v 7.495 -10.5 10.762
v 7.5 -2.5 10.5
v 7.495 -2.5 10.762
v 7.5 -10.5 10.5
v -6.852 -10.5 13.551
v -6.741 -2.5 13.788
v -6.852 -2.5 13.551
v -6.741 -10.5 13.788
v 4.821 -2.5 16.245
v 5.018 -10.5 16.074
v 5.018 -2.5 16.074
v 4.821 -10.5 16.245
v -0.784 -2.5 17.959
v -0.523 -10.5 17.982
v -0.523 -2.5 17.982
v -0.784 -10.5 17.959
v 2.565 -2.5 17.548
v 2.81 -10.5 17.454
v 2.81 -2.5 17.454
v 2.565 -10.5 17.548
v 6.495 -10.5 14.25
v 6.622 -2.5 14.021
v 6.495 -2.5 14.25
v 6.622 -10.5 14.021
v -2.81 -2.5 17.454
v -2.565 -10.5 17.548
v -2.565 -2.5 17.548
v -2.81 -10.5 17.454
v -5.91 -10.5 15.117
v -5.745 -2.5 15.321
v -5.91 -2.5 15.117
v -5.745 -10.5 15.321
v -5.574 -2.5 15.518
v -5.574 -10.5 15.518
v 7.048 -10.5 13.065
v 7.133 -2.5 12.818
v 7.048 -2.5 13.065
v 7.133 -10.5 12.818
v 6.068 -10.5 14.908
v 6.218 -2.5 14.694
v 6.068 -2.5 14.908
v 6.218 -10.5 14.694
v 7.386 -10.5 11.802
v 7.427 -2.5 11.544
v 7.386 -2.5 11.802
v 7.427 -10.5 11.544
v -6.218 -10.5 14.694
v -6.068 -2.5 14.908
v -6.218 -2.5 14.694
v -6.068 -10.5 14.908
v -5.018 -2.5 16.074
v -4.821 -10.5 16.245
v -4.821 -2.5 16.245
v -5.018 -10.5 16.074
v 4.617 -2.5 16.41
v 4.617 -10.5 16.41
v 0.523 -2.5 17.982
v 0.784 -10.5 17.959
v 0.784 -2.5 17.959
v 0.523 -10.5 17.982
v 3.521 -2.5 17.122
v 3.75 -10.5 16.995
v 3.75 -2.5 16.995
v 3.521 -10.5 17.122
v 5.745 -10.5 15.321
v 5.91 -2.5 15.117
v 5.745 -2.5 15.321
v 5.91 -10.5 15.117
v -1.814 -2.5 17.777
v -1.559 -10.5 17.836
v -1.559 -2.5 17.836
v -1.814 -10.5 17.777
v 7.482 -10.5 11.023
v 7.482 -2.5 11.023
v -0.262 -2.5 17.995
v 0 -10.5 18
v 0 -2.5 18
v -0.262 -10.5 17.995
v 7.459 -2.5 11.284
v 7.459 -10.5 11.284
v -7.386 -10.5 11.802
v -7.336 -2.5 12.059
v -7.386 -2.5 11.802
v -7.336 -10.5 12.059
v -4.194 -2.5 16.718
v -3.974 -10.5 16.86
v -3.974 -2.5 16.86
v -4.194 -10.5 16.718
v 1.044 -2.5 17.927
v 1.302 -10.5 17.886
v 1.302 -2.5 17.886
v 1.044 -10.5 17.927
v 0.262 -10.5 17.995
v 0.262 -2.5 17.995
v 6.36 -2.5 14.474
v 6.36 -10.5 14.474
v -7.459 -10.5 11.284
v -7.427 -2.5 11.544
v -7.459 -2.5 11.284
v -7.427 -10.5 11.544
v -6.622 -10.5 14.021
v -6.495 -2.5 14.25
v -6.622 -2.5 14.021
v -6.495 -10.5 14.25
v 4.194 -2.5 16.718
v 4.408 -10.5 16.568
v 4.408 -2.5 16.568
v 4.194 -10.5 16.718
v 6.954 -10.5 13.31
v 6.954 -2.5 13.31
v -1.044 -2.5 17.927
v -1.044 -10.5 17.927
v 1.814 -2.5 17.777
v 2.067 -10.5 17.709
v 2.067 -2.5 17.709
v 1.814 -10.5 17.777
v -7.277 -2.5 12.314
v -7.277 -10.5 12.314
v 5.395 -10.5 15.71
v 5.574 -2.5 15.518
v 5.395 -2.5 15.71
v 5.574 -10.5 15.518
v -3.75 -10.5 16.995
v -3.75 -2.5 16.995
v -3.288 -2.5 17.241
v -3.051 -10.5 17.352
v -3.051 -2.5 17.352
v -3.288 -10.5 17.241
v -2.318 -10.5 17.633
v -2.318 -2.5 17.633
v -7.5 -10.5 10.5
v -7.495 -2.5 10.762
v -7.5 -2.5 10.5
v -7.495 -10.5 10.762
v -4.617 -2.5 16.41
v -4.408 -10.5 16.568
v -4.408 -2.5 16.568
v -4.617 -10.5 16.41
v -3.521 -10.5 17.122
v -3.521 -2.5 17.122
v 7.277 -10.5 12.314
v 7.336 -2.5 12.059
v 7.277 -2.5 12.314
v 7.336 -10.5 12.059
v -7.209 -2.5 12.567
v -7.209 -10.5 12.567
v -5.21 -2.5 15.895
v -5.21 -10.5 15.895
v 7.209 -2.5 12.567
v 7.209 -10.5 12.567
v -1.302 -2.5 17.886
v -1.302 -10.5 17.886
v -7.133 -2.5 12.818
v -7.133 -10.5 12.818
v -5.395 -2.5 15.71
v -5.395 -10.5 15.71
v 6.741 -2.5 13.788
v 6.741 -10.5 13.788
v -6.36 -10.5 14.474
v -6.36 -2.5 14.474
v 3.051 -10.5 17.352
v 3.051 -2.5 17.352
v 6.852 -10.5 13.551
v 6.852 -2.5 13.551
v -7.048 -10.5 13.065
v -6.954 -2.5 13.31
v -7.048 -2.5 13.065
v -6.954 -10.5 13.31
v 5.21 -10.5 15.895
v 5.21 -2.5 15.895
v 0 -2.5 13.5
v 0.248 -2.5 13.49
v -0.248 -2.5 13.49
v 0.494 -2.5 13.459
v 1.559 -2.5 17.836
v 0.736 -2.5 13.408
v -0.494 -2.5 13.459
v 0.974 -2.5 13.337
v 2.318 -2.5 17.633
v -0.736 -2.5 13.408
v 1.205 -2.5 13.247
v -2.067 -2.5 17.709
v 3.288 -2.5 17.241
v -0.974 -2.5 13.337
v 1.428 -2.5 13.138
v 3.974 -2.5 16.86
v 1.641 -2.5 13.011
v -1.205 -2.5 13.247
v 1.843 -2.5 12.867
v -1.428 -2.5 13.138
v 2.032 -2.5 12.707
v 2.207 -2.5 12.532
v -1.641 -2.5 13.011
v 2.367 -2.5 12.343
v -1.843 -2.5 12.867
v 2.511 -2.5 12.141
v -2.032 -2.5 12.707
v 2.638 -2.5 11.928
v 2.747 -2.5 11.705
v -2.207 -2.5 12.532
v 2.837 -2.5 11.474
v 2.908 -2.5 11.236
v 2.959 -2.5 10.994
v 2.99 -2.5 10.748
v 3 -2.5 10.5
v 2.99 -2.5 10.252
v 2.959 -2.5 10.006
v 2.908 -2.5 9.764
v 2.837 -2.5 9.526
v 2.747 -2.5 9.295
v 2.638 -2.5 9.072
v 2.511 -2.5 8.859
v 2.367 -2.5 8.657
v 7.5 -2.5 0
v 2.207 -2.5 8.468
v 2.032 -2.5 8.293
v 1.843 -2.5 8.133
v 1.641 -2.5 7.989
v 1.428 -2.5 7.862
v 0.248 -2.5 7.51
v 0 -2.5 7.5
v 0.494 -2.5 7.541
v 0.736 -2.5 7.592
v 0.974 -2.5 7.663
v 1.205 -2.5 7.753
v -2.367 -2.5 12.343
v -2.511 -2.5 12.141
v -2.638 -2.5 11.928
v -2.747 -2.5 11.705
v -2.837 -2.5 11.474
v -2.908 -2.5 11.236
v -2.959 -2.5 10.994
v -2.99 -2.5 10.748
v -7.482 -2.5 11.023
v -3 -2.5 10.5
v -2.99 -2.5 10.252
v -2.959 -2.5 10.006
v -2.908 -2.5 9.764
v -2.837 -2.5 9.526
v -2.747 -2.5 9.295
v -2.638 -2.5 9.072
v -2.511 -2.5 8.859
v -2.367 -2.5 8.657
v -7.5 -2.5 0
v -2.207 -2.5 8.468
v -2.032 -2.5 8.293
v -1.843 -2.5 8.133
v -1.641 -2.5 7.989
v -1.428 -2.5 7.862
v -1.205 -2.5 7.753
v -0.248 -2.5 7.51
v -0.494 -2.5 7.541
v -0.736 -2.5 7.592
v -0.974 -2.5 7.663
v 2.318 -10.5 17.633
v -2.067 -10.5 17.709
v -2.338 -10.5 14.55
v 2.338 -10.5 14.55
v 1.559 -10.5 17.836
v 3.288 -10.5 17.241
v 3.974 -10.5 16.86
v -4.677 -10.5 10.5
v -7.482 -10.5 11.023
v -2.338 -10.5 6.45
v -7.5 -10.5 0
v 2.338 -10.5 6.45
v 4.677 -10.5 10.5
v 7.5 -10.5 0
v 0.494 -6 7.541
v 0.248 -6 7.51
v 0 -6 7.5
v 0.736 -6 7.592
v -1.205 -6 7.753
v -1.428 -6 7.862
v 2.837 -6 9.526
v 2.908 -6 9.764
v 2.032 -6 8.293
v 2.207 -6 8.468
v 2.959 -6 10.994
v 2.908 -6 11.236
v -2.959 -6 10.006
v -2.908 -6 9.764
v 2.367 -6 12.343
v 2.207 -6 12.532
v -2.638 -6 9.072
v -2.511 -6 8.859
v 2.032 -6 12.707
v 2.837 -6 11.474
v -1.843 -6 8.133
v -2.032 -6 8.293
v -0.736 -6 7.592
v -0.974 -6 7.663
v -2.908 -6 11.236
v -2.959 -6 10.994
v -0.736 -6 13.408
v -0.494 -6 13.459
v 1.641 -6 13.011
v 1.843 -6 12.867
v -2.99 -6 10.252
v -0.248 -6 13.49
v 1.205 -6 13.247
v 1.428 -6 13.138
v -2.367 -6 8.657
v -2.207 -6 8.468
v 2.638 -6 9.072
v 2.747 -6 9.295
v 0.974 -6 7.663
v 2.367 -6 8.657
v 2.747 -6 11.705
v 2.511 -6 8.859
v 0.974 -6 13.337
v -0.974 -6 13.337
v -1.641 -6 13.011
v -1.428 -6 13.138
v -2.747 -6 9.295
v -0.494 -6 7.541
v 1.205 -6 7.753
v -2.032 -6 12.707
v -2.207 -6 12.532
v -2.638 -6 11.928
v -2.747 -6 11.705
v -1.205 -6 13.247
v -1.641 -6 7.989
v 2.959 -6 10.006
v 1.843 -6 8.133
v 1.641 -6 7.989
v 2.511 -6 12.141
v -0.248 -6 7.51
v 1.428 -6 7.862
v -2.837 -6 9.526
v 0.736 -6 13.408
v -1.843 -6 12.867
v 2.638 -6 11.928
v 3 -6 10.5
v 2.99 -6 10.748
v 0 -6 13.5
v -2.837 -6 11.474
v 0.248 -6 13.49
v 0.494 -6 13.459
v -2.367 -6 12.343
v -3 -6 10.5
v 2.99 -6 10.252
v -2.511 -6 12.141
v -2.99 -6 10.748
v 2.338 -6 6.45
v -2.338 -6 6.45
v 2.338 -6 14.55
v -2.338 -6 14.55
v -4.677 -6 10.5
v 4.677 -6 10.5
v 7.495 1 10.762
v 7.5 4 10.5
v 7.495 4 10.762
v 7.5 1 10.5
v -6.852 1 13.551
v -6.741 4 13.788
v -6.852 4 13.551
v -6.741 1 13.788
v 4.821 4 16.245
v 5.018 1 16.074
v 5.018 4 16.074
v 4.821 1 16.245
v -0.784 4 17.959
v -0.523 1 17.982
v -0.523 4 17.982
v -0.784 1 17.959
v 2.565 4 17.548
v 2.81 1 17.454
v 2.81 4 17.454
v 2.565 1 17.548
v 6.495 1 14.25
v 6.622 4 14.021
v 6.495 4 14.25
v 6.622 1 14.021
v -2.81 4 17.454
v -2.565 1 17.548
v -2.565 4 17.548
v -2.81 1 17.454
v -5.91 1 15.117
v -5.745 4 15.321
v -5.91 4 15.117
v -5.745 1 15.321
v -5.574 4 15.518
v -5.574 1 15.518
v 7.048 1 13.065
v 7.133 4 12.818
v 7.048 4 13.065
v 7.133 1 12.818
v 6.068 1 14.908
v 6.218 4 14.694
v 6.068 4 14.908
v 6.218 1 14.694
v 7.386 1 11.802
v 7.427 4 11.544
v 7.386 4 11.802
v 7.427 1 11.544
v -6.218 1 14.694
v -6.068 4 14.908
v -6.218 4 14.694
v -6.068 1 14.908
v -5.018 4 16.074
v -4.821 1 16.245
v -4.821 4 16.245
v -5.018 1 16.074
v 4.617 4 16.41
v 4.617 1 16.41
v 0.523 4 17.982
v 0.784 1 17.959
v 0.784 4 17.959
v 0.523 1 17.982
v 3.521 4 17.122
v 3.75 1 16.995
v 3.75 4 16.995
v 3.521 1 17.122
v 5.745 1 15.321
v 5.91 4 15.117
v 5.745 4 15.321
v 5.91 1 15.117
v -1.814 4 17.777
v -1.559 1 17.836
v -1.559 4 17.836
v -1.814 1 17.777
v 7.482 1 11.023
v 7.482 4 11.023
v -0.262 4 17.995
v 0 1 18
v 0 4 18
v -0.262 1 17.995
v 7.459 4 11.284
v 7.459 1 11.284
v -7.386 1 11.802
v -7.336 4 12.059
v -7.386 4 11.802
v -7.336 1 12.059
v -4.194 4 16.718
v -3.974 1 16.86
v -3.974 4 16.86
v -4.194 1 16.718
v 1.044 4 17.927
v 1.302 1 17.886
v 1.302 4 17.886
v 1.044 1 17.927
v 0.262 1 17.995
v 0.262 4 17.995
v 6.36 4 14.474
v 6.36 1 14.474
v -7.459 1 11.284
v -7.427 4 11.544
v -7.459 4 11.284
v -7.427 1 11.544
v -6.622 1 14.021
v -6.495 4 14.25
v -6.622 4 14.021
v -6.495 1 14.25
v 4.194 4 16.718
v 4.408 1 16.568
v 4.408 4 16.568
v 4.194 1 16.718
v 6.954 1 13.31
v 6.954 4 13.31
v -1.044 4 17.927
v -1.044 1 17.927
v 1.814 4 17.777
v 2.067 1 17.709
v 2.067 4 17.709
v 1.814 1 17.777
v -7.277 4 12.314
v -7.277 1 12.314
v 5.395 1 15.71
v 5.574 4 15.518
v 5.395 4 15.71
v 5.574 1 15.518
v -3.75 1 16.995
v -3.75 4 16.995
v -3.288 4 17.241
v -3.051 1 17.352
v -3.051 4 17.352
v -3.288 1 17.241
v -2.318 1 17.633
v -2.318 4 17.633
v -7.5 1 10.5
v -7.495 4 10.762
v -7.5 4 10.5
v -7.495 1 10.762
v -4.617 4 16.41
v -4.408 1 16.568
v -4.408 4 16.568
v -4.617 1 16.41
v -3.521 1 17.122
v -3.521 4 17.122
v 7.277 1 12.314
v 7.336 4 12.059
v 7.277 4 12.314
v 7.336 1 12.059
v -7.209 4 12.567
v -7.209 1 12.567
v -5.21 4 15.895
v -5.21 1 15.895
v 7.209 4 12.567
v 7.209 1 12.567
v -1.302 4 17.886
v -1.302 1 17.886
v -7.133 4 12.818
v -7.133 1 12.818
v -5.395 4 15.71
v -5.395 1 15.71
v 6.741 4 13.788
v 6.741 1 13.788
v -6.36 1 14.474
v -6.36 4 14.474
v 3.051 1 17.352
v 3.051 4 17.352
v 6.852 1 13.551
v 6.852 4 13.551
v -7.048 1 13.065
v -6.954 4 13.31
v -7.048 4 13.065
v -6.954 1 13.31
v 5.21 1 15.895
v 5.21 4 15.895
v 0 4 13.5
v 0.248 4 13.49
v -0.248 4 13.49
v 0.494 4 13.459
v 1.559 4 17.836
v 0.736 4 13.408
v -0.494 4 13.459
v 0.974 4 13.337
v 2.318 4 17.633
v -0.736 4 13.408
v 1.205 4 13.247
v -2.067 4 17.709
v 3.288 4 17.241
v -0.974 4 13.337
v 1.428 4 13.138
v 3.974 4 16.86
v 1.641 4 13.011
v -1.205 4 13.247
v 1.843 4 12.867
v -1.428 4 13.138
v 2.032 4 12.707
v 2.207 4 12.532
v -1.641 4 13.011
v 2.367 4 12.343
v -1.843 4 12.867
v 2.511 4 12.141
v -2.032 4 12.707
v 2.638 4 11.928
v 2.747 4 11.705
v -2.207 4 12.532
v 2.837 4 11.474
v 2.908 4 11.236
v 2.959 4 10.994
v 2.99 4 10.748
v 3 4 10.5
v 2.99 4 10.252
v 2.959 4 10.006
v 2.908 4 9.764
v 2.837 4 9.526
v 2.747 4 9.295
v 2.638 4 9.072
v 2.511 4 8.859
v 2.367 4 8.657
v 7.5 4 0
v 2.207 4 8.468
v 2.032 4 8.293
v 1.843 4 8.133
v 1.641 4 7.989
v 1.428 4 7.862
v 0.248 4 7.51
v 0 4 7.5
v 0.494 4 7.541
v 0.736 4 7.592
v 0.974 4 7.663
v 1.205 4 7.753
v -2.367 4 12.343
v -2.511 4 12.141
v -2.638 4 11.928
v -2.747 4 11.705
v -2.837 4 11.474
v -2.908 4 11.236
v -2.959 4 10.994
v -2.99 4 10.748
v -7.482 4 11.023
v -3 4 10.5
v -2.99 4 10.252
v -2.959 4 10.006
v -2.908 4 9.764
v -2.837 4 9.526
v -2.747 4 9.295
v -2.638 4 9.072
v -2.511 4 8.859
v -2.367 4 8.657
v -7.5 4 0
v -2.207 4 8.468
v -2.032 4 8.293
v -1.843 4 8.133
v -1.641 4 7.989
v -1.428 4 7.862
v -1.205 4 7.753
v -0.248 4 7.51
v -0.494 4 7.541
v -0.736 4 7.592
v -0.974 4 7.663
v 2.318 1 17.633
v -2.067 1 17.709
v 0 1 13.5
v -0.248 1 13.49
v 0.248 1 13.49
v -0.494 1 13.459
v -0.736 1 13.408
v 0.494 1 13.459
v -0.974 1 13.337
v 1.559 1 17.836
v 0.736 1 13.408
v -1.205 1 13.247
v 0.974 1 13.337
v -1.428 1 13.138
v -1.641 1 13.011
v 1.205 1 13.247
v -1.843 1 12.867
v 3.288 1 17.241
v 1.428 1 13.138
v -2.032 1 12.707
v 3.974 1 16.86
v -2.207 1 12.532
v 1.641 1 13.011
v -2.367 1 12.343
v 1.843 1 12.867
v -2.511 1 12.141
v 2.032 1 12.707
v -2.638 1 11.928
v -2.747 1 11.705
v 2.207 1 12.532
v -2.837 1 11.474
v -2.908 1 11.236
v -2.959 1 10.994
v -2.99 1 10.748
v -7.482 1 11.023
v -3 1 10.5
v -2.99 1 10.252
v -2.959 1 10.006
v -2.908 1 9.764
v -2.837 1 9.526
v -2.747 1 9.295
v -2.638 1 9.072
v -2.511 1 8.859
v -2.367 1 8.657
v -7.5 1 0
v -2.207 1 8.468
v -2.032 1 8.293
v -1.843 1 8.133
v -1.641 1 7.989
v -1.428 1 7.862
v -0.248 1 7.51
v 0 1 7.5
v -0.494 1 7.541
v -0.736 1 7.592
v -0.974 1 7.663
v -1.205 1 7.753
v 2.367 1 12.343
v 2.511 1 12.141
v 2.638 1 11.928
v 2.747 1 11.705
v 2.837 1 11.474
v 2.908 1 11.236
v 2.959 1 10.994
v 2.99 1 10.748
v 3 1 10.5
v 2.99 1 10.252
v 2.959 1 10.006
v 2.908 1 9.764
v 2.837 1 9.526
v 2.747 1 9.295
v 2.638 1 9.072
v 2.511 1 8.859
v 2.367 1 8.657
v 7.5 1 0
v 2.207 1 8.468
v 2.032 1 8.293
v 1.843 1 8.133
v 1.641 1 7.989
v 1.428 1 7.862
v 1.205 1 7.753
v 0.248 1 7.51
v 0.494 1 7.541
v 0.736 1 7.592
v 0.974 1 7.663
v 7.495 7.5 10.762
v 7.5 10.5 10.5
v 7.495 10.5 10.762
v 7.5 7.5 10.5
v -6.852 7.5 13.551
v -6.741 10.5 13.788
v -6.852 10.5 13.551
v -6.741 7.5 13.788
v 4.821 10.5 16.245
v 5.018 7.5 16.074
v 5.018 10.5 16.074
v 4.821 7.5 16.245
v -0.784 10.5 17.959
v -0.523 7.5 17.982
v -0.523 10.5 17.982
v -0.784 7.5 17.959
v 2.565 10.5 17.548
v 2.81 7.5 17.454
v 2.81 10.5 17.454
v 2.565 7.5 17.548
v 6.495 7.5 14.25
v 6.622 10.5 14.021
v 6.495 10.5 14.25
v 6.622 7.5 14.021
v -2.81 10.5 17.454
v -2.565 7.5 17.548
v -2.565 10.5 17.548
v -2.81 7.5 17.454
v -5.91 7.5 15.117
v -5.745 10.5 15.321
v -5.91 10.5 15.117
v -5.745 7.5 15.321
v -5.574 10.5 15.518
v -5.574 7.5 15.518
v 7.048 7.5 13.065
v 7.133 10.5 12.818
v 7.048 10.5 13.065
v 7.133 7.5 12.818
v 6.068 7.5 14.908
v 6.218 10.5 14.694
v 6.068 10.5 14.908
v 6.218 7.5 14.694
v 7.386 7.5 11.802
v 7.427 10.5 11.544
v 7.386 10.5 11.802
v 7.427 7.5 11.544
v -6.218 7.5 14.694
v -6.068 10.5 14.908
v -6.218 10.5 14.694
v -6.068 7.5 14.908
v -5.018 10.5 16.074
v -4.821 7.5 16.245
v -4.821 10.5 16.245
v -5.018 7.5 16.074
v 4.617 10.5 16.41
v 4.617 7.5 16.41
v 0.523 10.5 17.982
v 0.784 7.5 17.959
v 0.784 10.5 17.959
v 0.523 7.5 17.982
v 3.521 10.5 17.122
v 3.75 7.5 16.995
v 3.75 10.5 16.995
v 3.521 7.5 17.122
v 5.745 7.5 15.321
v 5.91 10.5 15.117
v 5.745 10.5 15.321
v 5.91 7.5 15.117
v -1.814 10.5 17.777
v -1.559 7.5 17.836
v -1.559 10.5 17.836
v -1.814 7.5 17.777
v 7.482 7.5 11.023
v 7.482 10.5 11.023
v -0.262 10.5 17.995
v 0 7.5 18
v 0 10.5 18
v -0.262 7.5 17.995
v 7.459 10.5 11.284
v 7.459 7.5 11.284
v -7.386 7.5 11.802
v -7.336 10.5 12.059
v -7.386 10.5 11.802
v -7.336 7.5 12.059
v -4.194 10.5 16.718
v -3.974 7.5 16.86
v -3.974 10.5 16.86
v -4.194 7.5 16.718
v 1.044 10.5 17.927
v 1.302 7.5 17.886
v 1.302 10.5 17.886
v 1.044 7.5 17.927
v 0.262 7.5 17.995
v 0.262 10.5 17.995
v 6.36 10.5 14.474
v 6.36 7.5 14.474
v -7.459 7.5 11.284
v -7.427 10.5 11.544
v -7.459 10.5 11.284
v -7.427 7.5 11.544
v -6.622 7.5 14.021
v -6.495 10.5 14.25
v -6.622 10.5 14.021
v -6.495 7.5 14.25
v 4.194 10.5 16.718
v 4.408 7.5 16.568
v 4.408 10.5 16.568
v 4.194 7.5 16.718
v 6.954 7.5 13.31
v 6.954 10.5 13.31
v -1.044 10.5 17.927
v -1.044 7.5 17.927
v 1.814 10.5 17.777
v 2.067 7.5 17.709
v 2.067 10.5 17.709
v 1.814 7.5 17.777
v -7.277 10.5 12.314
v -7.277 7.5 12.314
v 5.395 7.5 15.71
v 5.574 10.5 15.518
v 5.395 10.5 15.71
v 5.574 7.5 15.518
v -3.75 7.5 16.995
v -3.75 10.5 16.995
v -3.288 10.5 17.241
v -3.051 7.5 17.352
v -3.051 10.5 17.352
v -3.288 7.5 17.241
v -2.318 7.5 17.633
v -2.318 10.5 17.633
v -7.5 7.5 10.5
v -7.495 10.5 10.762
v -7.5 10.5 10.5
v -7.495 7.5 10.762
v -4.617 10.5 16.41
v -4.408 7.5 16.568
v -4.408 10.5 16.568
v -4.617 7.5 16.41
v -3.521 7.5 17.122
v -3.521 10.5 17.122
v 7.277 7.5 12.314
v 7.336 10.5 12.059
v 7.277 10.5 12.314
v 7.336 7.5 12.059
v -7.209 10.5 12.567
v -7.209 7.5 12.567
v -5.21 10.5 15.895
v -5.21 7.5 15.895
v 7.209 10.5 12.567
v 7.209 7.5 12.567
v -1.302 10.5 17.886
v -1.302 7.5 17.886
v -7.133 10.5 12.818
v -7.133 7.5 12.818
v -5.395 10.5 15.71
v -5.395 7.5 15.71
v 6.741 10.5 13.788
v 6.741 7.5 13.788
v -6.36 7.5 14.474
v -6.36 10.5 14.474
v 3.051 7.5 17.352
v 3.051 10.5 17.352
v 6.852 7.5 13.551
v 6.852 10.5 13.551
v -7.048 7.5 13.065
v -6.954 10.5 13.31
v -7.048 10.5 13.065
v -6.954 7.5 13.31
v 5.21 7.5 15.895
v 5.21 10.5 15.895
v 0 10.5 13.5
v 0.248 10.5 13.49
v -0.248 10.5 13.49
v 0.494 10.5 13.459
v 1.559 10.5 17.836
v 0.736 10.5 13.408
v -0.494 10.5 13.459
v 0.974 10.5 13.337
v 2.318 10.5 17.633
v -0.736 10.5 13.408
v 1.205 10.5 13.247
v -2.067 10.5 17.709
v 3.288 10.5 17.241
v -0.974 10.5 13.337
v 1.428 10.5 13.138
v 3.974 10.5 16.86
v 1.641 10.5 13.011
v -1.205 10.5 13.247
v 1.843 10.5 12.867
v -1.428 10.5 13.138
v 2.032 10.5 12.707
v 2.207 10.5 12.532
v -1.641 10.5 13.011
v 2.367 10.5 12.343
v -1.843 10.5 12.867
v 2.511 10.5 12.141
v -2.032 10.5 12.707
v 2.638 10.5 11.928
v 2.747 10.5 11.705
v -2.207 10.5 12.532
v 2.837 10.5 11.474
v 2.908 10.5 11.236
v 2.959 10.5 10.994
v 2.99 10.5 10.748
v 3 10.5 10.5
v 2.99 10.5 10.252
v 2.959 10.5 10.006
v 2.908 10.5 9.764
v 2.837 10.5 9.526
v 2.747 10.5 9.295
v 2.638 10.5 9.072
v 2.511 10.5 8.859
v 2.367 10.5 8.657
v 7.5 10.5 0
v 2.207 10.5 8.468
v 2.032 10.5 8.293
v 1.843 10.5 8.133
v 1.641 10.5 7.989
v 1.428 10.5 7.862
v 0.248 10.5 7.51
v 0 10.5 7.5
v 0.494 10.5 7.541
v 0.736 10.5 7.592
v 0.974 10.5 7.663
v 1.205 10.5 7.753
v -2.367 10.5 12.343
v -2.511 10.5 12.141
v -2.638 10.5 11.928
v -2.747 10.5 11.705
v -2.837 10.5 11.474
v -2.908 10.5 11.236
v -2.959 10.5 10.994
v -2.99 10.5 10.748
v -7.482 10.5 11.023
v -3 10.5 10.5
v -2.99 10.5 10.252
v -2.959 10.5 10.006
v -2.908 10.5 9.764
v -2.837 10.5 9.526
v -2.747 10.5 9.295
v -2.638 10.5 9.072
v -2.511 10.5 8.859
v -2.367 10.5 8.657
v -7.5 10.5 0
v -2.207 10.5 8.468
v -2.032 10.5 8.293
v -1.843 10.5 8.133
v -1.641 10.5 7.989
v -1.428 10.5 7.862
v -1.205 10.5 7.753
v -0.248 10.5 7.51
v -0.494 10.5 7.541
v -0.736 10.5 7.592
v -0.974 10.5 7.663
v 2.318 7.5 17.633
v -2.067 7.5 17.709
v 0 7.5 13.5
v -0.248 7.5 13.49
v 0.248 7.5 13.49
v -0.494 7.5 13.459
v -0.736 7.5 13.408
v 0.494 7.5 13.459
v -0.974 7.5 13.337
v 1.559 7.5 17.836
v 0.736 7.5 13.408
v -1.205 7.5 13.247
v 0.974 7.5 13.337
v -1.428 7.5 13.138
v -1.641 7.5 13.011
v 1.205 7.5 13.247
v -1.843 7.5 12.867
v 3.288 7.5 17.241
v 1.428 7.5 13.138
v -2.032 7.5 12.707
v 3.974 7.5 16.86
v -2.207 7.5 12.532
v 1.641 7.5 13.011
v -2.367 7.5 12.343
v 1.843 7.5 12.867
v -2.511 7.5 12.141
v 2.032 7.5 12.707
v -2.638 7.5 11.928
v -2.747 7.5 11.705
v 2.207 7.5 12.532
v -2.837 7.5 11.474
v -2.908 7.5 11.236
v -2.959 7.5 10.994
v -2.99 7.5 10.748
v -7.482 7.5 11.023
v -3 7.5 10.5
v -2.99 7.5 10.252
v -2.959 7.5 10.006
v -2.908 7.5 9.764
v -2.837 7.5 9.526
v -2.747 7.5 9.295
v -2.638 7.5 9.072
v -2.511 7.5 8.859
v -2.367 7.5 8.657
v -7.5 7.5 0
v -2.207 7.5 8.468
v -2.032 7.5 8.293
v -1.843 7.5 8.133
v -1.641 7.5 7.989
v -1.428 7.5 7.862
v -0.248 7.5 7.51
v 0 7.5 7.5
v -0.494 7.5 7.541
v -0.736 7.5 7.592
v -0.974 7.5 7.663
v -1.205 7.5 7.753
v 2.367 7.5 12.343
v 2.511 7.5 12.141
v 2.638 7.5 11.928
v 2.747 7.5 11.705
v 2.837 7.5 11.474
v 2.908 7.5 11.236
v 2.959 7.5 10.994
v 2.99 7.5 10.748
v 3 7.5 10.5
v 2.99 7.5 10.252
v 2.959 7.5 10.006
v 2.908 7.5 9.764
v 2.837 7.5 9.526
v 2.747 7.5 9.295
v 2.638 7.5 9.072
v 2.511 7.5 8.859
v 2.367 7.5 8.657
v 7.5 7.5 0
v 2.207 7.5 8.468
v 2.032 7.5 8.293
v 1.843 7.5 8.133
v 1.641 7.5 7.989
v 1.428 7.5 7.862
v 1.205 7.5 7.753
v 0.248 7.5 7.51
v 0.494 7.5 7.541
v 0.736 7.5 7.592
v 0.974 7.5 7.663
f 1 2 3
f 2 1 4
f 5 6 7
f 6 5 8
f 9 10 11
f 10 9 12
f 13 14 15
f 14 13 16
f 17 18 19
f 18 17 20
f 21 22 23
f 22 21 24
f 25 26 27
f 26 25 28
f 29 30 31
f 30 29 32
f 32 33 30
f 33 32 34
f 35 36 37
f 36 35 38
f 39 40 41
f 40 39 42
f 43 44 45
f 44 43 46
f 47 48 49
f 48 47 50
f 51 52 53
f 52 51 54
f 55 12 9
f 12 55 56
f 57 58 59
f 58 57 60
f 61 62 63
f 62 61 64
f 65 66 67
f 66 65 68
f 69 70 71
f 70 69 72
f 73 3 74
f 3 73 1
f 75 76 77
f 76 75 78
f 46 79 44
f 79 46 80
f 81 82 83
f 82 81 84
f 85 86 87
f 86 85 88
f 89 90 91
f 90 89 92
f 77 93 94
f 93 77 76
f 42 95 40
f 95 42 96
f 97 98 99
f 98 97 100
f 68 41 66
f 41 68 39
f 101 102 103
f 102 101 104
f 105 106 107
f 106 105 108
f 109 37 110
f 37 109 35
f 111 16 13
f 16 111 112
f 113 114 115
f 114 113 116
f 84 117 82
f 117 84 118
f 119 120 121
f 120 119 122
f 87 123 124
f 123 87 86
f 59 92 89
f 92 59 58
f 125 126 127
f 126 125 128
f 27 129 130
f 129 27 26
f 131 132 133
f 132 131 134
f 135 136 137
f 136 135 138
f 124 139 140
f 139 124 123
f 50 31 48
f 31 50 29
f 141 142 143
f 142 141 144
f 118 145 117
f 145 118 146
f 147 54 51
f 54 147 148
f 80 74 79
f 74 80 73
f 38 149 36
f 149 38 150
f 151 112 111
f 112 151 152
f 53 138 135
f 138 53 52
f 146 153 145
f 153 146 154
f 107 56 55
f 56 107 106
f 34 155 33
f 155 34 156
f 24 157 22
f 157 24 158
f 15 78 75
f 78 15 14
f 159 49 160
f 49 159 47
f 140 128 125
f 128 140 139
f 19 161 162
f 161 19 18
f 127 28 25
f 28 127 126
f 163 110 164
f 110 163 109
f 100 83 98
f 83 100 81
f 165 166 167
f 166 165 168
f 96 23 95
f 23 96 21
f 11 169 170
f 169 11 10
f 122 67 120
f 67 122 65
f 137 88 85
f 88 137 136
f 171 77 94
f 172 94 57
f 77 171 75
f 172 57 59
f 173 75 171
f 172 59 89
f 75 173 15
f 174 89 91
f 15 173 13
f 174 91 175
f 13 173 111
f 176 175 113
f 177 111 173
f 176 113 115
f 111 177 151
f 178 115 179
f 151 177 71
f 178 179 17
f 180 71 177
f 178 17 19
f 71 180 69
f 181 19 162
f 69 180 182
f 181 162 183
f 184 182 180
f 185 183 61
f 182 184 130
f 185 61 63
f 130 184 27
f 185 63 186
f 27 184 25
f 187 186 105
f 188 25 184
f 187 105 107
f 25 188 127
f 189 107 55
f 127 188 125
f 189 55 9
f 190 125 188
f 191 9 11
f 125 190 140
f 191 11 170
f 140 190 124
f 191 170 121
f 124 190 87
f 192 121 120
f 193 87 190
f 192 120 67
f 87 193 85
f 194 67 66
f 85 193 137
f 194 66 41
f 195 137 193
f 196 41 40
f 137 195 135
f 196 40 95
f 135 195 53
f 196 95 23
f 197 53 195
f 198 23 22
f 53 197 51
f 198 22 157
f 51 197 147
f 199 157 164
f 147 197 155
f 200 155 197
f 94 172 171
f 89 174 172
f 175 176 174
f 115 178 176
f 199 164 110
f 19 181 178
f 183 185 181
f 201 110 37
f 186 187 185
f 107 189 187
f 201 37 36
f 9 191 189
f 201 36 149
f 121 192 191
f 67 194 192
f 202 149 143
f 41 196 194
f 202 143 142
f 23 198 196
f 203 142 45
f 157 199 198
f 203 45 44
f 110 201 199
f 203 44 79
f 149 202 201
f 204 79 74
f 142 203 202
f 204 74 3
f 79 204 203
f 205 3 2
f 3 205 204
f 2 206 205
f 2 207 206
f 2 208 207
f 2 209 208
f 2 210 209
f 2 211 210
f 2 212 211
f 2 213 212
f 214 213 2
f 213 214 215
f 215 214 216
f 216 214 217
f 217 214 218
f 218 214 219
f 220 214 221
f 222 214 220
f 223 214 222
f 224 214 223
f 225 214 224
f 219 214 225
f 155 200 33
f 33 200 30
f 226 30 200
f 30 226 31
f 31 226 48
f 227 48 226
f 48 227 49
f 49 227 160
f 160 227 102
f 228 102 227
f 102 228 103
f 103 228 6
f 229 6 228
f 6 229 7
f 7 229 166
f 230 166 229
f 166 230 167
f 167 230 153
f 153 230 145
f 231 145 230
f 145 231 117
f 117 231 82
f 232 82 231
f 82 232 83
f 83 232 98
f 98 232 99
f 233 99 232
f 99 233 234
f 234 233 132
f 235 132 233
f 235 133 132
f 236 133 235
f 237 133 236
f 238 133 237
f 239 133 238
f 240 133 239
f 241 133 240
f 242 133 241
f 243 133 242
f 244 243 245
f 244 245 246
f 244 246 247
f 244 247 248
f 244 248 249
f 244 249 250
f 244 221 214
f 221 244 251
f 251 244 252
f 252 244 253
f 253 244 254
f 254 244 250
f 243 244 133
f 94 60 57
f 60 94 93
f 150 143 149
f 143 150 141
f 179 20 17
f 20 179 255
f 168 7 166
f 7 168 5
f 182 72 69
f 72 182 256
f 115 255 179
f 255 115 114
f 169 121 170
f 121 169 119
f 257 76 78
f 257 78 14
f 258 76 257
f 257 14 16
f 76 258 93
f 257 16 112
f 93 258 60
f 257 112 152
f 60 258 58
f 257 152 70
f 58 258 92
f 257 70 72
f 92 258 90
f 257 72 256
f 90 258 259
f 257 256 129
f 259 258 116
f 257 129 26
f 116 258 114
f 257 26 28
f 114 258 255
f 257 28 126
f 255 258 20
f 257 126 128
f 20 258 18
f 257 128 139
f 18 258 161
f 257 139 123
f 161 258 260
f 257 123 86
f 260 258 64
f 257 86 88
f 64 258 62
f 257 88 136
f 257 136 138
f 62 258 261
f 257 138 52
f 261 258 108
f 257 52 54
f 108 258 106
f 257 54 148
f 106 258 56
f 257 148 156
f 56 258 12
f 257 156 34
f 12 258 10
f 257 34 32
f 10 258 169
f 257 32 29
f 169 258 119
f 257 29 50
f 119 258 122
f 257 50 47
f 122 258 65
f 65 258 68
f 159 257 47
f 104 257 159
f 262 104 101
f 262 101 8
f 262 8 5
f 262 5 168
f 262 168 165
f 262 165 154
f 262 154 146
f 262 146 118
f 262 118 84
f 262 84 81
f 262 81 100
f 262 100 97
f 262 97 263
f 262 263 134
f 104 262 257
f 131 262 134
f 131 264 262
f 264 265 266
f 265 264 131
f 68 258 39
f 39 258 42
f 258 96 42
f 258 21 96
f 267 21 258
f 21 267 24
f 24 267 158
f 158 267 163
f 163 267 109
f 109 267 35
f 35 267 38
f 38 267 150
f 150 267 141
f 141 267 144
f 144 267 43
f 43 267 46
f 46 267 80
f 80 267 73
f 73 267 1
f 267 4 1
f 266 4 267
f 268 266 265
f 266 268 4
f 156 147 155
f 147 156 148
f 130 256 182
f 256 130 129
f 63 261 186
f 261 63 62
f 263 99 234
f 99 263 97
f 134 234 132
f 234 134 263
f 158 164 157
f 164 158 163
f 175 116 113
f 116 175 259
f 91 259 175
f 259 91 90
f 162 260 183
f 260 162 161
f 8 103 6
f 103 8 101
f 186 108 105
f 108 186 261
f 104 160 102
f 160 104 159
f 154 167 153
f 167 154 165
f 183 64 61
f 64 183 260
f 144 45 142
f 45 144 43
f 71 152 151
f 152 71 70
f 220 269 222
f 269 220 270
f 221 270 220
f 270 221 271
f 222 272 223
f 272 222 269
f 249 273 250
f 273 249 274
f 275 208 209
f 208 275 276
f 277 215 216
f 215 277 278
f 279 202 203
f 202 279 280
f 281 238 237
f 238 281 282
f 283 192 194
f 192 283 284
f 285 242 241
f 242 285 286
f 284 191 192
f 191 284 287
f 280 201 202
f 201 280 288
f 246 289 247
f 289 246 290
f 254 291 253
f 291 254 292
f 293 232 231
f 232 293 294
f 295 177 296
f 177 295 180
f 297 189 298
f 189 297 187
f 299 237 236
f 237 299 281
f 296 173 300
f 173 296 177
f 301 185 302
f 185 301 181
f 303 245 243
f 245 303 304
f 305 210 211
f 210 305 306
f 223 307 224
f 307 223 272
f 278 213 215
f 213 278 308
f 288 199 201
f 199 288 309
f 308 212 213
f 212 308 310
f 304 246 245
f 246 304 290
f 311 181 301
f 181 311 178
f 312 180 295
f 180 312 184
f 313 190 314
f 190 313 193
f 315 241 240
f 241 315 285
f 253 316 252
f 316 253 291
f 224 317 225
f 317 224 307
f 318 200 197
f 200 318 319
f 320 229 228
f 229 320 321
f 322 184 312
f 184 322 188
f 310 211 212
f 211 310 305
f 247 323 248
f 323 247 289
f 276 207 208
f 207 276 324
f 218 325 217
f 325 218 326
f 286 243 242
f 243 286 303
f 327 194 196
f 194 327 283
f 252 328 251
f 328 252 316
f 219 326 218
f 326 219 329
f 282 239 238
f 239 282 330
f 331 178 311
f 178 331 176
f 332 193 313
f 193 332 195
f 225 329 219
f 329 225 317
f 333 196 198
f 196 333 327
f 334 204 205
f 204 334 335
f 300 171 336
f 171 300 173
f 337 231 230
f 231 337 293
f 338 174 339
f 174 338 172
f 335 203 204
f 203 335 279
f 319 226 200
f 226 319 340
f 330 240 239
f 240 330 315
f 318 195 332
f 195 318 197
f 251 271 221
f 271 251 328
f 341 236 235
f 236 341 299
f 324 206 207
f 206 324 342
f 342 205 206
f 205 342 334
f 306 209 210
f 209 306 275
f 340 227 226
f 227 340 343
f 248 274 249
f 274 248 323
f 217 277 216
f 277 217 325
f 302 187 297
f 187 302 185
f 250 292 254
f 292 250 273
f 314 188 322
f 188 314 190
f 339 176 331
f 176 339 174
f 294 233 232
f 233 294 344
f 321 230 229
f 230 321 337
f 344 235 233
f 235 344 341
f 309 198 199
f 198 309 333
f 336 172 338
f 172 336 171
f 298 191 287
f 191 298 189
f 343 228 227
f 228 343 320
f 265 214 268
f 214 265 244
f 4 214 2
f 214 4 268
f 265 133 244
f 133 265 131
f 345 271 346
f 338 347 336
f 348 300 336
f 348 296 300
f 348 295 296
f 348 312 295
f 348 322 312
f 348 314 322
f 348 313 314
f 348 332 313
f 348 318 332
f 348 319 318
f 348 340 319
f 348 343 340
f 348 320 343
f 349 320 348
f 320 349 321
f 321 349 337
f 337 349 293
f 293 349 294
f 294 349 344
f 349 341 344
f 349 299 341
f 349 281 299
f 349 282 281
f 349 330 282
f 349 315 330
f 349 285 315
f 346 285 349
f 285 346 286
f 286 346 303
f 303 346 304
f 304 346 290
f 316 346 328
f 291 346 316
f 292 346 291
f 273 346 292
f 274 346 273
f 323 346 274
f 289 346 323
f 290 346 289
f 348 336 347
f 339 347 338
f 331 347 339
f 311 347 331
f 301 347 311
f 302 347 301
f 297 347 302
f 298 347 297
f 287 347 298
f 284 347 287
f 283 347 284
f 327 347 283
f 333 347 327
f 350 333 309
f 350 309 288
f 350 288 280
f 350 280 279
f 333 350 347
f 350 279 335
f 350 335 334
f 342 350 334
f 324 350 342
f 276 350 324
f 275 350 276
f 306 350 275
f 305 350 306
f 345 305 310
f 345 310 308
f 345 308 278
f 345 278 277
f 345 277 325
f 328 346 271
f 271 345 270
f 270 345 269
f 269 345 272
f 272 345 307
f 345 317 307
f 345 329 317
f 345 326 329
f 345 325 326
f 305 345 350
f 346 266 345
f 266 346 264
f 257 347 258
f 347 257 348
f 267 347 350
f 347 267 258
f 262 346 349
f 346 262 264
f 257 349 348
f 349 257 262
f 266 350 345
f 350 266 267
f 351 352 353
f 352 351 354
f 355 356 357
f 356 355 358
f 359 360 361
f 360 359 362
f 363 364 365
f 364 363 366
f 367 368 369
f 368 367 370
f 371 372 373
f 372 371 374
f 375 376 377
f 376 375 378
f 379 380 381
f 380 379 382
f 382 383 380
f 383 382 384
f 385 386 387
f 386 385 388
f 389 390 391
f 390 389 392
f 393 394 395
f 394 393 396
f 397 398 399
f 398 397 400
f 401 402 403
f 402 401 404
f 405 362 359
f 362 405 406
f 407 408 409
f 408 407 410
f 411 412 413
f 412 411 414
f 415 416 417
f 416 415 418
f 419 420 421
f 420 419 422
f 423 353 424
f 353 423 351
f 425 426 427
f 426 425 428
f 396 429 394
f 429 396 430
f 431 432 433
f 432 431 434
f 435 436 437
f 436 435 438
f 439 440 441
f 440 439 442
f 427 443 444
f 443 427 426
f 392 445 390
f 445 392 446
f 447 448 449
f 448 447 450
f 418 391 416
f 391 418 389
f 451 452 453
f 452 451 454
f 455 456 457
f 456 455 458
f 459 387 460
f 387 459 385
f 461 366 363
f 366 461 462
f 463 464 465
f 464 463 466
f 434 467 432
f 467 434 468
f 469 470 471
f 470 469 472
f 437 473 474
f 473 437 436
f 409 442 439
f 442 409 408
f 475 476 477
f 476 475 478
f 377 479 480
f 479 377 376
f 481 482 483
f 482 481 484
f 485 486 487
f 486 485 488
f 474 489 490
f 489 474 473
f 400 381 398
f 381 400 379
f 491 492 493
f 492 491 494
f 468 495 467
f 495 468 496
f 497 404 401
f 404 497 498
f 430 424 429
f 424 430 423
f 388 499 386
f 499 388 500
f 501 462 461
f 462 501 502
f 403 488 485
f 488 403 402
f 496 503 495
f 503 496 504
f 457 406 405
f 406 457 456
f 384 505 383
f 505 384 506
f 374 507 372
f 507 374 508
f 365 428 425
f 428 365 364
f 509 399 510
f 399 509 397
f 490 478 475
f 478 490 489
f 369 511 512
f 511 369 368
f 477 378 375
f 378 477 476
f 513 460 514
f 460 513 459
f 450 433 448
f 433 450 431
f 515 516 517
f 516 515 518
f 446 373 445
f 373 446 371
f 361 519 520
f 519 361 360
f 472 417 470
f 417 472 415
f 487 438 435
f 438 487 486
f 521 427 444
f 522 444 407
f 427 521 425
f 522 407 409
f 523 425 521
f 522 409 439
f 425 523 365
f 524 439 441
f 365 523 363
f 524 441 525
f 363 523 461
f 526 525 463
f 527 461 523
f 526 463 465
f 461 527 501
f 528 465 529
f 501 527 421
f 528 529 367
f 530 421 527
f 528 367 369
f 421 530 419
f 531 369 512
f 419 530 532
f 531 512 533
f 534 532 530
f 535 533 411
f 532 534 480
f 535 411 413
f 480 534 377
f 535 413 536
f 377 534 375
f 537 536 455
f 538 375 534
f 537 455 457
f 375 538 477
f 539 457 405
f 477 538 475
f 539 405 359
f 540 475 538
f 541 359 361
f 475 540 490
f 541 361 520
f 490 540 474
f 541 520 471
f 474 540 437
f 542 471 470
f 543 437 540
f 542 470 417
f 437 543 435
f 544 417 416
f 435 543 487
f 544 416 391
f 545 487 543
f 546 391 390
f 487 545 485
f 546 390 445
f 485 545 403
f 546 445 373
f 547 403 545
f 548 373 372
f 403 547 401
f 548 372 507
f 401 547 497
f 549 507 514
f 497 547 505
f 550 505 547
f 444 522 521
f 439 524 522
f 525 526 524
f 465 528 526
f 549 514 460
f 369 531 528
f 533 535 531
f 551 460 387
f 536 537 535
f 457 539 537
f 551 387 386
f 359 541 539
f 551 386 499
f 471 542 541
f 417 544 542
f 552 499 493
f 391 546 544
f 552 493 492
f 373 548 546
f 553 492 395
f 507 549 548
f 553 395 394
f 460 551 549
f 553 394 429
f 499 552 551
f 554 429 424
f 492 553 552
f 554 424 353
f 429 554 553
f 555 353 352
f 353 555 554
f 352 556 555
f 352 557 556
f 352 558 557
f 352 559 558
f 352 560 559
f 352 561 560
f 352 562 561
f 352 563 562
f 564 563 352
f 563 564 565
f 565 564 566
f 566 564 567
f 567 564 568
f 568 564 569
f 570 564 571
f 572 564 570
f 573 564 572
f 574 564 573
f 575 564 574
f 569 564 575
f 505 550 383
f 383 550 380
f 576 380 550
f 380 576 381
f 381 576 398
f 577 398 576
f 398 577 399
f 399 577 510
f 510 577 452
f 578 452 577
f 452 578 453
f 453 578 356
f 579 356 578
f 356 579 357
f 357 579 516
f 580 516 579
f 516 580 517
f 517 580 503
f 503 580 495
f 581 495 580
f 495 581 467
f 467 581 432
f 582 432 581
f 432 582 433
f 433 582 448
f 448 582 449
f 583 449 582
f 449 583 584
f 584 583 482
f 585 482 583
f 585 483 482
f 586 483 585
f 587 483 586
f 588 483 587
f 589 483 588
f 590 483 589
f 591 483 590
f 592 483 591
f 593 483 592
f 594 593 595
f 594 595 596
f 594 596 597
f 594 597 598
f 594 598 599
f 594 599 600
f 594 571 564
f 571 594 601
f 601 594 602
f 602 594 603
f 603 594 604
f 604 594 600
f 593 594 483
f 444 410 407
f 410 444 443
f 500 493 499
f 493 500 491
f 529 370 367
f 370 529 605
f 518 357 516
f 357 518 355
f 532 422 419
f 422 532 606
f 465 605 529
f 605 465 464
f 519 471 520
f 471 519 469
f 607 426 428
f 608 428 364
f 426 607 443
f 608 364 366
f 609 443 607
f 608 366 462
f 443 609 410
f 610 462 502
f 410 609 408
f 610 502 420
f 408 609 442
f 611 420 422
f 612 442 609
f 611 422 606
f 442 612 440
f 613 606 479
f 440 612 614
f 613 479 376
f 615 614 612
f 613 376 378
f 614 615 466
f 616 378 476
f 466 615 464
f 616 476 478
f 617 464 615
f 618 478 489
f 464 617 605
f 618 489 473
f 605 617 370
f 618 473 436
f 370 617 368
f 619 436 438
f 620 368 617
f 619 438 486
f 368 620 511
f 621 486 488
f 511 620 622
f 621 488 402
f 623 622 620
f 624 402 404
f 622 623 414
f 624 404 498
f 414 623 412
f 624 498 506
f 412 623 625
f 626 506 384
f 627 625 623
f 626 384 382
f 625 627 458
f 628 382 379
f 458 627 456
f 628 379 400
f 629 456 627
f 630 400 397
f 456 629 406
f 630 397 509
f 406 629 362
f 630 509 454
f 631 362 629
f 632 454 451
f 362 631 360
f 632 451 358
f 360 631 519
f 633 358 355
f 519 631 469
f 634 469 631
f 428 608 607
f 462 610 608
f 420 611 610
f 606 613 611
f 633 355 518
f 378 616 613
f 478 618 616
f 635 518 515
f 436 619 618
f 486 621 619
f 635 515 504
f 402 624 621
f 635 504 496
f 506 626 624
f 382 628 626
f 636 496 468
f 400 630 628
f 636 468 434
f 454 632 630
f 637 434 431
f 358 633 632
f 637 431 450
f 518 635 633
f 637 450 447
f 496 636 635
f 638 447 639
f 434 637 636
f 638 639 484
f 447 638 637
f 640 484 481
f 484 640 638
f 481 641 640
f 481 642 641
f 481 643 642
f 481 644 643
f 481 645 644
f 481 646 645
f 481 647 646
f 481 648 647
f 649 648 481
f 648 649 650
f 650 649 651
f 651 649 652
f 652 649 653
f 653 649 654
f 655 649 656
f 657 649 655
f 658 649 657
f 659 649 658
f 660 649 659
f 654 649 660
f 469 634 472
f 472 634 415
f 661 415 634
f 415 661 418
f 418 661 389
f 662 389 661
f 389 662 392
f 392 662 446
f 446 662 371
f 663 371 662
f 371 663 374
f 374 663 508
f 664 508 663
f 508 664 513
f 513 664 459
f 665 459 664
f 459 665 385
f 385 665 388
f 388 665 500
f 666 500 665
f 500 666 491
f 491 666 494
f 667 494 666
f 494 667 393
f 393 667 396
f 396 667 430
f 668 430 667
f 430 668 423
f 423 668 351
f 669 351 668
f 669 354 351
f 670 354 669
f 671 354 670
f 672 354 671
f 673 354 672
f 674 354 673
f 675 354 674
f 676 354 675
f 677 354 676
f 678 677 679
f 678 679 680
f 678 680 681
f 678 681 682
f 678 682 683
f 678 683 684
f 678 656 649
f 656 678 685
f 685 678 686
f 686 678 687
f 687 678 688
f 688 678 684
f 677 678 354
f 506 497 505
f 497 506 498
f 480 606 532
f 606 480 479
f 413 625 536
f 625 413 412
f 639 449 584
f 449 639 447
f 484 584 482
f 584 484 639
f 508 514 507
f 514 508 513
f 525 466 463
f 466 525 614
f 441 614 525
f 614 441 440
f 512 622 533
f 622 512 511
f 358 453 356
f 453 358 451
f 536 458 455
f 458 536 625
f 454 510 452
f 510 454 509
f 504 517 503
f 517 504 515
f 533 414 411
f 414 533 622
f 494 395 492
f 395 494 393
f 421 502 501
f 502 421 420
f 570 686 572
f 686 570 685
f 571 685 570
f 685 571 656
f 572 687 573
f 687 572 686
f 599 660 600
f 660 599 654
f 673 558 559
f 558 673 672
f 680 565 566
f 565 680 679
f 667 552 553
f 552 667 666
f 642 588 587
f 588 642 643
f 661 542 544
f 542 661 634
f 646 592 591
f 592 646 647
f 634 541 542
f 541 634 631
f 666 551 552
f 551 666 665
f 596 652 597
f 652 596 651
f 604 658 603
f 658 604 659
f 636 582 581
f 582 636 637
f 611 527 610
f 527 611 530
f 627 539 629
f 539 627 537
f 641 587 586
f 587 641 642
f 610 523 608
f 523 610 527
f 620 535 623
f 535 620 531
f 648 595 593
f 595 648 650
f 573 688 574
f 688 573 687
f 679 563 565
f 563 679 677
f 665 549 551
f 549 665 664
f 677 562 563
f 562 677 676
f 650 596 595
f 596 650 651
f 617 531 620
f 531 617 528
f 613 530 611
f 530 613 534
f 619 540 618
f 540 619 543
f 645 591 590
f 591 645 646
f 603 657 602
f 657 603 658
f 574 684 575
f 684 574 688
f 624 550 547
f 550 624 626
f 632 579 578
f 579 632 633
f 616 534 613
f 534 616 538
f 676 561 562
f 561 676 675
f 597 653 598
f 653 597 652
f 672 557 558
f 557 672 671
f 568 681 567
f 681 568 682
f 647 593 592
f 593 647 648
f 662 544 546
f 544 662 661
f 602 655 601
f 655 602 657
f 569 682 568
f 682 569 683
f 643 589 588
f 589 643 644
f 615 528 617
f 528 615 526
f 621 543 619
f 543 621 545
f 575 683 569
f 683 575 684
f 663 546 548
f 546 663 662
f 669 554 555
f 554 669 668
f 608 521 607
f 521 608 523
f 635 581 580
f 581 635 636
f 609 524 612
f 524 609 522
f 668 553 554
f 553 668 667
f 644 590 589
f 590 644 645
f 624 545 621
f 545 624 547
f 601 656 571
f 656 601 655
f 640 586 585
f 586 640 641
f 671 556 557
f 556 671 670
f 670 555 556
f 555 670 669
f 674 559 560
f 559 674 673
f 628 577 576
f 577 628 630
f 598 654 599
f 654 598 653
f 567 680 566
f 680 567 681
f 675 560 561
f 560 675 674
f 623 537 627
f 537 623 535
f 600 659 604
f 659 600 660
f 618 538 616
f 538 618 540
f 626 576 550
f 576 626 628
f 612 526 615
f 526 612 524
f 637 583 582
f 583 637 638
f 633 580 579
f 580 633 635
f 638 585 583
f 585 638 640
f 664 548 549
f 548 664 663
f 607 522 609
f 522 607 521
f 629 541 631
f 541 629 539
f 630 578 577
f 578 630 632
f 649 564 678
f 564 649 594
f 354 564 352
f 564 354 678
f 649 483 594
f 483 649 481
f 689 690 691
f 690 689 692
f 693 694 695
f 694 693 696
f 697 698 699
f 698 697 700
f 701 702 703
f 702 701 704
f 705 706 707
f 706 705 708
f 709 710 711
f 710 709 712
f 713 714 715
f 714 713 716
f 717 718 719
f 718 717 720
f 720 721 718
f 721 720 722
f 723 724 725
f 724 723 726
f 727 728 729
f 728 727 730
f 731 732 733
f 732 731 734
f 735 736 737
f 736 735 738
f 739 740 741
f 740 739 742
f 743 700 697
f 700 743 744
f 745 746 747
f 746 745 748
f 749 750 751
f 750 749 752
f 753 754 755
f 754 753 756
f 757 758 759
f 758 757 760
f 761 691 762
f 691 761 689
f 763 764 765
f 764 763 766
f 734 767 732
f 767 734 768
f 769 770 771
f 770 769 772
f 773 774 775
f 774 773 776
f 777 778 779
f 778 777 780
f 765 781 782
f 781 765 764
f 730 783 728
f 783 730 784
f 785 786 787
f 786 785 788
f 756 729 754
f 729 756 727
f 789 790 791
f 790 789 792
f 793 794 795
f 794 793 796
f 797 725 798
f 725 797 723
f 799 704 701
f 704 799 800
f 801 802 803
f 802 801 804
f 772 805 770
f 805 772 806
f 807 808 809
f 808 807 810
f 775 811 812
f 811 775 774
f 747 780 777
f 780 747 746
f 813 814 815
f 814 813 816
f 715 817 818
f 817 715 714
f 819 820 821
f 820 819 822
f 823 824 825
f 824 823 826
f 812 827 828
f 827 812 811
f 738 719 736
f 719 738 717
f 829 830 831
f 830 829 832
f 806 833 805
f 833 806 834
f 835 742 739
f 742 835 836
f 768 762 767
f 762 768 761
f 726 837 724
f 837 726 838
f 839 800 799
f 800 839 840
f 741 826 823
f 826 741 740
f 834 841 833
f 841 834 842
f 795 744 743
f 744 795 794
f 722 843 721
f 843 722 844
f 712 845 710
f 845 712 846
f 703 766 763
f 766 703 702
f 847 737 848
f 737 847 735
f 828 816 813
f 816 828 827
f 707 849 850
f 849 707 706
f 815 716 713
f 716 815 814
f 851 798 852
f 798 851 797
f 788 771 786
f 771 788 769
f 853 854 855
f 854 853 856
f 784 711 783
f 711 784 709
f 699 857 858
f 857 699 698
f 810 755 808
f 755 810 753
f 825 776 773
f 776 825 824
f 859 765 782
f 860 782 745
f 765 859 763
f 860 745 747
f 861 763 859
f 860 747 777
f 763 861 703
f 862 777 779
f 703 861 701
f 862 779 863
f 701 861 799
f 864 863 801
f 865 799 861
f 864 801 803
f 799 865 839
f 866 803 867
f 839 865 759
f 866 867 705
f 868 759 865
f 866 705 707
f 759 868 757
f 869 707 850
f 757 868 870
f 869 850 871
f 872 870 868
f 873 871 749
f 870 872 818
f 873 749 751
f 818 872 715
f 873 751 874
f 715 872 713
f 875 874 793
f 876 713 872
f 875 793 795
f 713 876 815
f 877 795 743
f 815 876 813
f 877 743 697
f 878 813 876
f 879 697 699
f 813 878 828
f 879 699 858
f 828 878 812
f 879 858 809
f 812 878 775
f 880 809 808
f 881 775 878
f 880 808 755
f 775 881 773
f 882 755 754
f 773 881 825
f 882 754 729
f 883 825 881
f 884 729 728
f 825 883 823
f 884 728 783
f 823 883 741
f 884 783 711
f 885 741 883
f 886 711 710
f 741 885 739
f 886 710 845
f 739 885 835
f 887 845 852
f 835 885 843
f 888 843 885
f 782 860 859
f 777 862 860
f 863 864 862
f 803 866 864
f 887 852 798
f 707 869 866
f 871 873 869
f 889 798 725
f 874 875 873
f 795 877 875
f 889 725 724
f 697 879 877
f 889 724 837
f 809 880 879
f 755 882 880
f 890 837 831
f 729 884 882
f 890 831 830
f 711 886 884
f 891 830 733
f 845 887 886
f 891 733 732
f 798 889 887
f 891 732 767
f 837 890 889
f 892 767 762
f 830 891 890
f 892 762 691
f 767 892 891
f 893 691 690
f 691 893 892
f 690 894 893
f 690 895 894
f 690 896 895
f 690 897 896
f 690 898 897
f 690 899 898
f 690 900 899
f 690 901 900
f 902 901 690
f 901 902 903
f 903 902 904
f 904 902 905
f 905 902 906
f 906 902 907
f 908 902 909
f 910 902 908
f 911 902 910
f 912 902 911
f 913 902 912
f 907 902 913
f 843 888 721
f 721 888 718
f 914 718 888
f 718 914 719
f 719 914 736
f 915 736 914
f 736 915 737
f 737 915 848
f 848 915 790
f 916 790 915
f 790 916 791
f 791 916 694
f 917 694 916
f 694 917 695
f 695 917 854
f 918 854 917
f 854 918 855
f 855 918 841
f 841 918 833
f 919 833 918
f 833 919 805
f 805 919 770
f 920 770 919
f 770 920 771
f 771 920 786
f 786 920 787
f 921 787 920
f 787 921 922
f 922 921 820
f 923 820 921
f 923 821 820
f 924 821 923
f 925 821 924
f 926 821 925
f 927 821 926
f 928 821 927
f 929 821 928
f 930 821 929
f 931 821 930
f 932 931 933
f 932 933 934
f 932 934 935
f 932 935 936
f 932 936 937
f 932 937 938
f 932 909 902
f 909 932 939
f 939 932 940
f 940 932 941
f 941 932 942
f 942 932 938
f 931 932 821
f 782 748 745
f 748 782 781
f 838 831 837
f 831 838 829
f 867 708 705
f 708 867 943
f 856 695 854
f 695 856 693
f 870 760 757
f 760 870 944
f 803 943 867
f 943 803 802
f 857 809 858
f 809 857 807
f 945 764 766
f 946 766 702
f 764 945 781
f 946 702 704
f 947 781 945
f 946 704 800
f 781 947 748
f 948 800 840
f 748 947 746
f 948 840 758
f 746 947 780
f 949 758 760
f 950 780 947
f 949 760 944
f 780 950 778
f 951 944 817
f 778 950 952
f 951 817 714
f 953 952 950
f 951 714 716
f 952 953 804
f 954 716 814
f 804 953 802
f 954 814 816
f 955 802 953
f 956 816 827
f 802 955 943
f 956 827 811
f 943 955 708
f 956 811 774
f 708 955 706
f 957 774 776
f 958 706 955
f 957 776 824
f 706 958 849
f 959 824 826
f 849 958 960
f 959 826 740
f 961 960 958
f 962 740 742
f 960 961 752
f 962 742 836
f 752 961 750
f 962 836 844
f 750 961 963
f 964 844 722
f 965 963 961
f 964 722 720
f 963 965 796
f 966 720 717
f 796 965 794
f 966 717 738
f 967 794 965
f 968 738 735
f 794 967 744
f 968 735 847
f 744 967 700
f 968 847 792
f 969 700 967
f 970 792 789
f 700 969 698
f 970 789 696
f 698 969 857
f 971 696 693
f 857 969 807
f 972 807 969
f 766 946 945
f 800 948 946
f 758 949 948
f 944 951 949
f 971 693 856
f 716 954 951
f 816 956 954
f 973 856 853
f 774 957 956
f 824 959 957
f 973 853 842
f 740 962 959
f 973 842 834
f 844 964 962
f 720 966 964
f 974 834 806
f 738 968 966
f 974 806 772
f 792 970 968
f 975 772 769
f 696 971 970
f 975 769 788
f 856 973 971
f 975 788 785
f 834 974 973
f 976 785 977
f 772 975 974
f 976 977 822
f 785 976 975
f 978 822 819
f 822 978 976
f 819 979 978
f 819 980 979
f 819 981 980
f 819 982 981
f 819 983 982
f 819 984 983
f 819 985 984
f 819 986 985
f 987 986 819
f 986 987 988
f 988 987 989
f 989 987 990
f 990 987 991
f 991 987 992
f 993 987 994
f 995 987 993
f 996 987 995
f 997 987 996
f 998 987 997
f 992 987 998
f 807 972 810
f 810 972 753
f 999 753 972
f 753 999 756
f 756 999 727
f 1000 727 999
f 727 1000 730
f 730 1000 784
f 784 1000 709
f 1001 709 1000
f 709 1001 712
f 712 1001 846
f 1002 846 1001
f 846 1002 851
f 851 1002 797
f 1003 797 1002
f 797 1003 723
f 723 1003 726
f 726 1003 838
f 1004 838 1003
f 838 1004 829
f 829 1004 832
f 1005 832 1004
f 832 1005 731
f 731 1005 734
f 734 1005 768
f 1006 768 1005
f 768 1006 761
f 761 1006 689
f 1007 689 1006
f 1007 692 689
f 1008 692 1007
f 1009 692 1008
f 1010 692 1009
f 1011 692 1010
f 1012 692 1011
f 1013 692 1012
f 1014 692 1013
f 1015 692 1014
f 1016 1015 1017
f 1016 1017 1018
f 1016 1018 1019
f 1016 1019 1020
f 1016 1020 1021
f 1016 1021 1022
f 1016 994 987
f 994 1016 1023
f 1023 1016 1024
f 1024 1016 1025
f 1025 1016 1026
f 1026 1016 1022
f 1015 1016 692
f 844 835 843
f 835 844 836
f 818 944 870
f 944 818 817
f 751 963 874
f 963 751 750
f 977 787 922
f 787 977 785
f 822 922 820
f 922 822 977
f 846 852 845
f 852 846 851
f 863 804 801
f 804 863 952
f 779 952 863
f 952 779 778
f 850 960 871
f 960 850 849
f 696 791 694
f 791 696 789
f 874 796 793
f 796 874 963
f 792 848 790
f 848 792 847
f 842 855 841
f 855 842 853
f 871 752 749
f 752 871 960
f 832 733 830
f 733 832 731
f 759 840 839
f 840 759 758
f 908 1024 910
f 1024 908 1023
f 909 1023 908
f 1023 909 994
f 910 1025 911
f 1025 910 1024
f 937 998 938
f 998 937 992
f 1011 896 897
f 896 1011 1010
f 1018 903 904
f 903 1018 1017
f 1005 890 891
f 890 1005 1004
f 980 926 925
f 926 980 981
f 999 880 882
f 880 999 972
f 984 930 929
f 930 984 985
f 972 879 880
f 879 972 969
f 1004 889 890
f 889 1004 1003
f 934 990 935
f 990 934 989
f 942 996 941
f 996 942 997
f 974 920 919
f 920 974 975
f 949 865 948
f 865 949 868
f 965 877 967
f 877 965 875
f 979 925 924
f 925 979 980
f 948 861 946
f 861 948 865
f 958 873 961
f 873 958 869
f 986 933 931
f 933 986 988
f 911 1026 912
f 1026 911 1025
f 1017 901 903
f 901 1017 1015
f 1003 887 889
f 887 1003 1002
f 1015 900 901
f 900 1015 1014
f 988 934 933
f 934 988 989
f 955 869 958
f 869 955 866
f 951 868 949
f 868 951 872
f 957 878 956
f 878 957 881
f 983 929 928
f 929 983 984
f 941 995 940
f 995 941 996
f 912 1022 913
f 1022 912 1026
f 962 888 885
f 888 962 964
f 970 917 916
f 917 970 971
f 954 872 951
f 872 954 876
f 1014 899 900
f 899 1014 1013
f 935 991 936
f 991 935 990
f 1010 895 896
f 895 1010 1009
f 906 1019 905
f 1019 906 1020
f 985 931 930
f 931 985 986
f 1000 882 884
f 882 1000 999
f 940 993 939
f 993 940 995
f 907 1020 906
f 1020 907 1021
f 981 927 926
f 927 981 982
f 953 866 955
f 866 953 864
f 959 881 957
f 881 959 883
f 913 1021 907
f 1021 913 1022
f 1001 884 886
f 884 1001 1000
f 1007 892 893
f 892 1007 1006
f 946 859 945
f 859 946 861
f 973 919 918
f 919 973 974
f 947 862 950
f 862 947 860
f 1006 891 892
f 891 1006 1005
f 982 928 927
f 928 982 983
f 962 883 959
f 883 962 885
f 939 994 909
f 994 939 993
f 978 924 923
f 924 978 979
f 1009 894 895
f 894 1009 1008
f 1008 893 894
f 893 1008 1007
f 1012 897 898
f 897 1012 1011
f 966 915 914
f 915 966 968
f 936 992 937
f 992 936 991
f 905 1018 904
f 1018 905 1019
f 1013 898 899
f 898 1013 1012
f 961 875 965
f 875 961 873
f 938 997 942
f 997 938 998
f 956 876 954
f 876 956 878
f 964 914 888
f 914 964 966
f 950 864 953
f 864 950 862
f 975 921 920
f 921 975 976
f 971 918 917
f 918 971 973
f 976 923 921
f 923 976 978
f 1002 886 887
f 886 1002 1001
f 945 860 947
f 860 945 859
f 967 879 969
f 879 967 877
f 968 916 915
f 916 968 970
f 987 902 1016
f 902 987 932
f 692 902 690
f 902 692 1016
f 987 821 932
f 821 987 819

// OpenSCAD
/*
Author: DMCShep
https://www.thingiverse.com/thing:3088912/files
License
Basic GoPro Mount - OpenSCAD byDMCShepis licensed under theBSD Licenselicense.
*/
$fa = 2;
$fs = 0.25;
Extra_Mount_Depth = 3;

module nut_hole()
{
	rotate([0, 90, 0]) // (Un)comment to rotate nut hole
	rotate([90, 0, 0])
		for(i = [0:(360 / 3):359])
		{
			rotate([0, 0, i])
				cube([4.6765, 8.1, 5], center = true);
		}
}

module flap(Width)
{
	rotate([90, 0, 0])
	union()
	{
		translate([3.5, (-7.5), 0])
			cube([4 + Extra_Mount_Depth, 15, Width]);


		translate([0, (-7.5), 0])
			cube([7.5 + Extra_Mount_Depth, 4, Width]);

		translate([0, 3.5, 0])
			cube([7.5 + Extra_Mount_Depth, 4, Width]);

		difference()
		{
			cylinder(h = Width, d = 15);

			translate([0, 0, (-1)])
				cylinder(h = Width + 2, d = 6);
		}
	}
}

module mount2()
{
	union()
	{

			translate([0, 4, 0])
		flap(3);

		translate([0, 10.5, 0])
		flap(3);
	}
}

module mount3()
{
	union()
	{
		difference()
		{
			translate([0, (-2.5), 0])
				flap(8);

			translate([0, (-8.5), 0])
				nut_hole();
		}

		mount2();
	}
}

/* GoPro Mount - 2 flap no nut hole
translate([0, 0, 10.5])
	rotate([0, 90, 0])
		mount2();
// */

//* GoPro Mount - 3 flap w/nut hole
translate([0, 0, 10.5])
	rotate([0, 90, 0])
		mount3();
// */
